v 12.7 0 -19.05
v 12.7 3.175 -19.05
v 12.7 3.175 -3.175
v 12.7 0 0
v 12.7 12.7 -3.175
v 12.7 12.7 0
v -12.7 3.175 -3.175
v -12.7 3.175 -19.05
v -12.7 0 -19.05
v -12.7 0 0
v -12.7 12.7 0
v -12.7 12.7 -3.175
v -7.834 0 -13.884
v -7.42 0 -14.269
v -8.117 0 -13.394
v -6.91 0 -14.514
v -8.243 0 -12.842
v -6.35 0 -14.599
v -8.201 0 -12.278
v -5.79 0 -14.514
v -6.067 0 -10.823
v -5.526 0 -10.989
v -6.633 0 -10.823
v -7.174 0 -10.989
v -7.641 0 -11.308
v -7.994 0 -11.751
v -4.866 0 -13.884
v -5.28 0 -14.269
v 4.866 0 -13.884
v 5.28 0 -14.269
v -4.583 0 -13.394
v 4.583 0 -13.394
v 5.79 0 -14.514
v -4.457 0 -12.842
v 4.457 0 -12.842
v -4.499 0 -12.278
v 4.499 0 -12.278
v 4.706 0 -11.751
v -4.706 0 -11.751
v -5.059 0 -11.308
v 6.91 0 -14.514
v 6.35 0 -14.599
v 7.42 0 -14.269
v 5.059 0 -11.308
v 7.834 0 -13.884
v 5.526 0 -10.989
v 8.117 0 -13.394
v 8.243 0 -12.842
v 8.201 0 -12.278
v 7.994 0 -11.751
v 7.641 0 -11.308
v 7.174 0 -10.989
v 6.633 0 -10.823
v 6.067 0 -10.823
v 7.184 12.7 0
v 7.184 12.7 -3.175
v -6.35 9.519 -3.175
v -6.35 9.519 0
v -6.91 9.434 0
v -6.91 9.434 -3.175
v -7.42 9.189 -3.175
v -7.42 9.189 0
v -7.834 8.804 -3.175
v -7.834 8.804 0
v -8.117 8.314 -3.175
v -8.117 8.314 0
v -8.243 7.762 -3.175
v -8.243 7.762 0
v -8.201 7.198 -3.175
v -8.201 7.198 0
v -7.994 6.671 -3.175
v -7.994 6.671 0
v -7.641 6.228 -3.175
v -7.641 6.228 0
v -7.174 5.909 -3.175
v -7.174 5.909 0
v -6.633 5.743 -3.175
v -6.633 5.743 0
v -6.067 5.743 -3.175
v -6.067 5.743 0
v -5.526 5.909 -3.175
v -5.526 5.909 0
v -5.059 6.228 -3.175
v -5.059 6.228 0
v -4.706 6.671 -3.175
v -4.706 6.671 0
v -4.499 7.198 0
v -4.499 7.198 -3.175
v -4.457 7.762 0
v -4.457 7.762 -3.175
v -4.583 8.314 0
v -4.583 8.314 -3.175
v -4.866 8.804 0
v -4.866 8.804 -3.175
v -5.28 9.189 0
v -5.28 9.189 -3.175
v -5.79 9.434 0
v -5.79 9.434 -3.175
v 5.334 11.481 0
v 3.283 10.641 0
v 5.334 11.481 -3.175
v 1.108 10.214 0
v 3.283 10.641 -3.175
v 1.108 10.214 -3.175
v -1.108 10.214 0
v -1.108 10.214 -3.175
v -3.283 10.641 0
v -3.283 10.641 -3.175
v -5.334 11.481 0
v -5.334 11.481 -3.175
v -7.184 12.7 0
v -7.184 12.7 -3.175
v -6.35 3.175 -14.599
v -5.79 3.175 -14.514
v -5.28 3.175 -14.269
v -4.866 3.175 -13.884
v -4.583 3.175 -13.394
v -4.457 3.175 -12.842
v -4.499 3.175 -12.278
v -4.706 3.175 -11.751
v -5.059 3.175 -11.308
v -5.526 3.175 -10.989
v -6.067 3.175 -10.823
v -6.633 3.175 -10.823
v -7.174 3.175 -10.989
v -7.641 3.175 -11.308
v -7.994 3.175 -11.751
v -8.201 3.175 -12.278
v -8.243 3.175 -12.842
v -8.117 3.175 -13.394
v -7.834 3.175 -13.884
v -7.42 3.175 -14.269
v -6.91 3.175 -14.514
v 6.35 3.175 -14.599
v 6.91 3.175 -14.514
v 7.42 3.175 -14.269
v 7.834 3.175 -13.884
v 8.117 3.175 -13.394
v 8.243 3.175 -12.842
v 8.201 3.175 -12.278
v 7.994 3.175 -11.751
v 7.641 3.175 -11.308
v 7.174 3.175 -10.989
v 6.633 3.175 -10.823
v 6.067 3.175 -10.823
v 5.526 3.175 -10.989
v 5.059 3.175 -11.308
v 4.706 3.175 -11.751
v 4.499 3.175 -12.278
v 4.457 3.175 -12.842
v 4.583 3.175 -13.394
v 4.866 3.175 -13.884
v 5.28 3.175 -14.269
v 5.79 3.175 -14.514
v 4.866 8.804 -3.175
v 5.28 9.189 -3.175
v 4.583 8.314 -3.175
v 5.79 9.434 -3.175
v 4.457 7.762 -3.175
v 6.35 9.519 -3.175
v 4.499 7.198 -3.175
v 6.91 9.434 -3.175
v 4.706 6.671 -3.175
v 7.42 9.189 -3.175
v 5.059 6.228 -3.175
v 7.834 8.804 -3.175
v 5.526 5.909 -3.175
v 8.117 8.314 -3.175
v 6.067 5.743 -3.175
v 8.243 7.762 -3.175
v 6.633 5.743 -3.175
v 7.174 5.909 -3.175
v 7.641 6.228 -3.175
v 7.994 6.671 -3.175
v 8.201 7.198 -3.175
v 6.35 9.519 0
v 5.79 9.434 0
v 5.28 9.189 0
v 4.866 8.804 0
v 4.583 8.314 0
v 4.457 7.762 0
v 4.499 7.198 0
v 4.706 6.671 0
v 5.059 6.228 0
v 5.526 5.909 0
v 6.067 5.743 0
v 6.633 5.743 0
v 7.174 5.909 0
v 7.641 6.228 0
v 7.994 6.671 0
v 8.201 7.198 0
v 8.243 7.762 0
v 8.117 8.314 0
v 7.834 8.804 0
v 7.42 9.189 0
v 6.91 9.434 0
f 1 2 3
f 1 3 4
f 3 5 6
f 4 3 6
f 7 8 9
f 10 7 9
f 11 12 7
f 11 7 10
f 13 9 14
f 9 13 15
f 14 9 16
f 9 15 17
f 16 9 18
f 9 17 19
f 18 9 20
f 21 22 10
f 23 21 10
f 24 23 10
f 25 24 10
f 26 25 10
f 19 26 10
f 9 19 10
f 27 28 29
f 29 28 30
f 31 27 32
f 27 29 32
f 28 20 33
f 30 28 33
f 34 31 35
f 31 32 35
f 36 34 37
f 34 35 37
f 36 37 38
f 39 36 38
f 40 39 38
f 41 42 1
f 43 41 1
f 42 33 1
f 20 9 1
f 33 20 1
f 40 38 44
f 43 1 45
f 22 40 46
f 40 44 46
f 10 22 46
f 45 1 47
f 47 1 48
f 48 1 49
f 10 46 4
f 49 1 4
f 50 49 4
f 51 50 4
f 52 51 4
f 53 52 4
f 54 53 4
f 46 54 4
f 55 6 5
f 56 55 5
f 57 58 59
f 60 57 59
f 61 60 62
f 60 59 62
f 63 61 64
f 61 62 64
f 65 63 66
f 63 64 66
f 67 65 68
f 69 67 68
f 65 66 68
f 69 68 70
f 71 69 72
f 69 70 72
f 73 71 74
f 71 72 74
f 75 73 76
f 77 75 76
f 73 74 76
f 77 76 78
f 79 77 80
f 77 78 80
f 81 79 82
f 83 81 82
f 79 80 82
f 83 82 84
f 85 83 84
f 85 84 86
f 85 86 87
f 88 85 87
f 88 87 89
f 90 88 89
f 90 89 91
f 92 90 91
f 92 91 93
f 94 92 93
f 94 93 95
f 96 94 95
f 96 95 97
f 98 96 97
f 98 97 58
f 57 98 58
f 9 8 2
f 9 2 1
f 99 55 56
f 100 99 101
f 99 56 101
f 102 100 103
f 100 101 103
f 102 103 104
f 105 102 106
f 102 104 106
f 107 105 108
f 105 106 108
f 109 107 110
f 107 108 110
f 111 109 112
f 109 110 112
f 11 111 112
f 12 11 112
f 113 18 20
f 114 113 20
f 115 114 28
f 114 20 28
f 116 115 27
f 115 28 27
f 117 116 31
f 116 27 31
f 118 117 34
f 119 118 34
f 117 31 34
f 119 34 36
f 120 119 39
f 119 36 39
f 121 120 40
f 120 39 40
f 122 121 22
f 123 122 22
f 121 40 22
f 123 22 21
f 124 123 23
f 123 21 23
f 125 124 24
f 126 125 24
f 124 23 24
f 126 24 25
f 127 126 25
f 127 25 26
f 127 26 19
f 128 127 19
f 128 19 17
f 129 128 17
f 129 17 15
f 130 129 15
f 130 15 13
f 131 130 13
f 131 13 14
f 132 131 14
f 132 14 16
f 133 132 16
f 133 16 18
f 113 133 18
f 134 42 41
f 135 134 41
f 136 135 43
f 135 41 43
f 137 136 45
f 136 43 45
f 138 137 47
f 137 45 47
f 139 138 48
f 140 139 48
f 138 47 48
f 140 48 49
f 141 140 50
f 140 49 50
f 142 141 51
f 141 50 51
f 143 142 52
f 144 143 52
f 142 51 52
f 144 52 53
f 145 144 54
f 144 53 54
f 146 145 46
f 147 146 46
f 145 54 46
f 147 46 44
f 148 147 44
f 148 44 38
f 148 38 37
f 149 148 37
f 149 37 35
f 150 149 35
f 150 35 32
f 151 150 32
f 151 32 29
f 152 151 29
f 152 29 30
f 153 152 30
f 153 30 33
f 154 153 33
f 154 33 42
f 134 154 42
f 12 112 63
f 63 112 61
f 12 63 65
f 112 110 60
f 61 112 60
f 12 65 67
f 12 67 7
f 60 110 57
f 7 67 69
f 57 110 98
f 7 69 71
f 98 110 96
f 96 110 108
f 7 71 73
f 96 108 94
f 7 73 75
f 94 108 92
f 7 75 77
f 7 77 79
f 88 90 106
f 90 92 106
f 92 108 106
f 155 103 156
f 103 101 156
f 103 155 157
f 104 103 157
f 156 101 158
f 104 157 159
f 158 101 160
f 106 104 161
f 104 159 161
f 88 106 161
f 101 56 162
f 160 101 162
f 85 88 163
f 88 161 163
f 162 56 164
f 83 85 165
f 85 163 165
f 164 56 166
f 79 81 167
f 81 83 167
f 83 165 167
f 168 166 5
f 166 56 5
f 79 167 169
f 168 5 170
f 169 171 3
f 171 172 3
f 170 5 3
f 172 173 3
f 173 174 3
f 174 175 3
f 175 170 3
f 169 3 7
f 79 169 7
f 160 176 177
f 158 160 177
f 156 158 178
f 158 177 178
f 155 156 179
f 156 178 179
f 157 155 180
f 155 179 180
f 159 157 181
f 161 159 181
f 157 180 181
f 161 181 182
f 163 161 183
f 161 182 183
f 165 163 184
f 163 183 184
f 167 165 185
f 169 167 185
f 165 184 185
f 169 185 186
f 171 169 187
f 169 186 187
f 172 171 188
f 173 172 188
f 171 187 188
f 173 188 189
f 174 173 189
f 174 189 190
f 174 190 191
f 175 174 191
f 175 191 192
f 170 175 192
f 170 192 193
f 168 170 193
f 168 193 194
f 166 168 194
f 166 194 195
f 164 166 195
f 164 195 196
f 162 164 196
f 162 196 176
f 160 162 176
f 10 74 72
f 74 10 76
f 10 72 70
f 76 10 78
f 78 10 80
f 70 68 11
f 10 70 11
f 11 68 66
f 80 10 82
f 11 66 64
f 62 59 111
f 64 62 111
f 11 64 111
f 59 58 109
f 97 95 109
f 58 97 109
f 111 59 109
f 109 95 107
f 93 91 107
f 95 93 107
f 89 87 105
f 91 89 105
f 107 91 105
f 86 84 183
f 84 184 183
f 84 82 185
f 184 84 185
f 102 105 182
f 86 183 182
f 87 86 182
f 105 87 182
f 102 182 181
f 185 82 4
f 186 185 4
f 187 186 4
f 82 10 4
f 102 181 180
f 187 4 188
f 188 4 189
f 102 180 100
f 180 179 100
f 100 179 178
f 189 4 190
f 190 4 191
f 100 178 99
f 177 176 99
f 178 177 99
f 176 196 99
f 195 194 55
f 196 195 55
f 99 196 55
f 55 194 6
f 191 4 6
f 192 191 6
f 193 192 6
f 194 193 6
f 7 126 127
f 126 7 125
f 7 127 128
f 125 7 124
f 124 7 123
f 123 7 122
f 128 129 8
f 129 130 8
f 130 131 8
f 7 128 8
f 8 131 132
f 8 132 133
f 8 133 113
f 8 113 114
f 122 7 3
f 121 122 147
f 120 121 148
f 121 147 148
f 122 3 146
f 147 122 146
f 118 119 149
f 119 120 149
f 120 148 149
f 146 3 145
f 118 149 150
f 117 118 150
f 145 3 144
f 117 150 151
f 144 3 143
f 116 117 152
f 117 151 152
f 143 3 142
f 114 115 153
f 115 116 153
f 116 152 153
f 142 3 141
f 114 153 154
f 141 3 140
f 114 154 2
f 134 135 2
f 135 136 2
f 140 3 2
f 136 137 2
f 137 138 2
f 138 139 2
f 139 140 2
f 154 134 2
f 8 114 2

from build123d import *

# Parameters (mm, degrees)
EXTRUDE1_DEPTH                      = 12.7
EXTRUDE1_DEPTH_BACK                 = 12.7
F_6_CLEARANCE_HOLE1_D               = 3.7973
F_6_CLEARANCE_HOLE1_DEPTH           = 12.7
F_6_CLEARANCE_HOLE1_TIP             = 1.140824014
F_6_CLEARANCE_HOLE1_ON_FACE_2_D     = 3.7973
F_6_CLEARANCE_HOLE1_ON_FACE_2_DEPTH = 12.7
F_6_CLEARANCE_HOLE1_ON_FACE_2_TIP   = 1.140824014
SKETCH4_R                           = 11.43
CUT_EXTRUDE1_DEPTH                  = 24.970724332


with BuildPart() as part:
    # Sketch2 → Extrude1 (new, two sides: drawn at the far end of the back side and taken through both)
    with BuildSketch(Plane(origin=(0, 0, 0), x_dir=(0, 0, -1), z_dir=(1, 0, 0)).offset(-EXTRUDE1_DEPTH_BACK)):
        Polygon((0, 0), (0, 12.7), (3.175, 12.7), (3.175, 3.175), (19.05, 3.175), (19.05, 0), align=None)
    extrude(amount=EXTRUDE1_DEPTH + EXTRUDE1_DEPTH_BACK)

    # #6 Clearance Hole1
    with Locations(Plane(origin=(6.35, 7.62, -3.175), x_dir=(0, -1, 0), z_dir=(0, 0, -1))):
        with Locations((0, 0), (0, 12.7)):
            Hole(F_6_CLEARANCE_HOLE1_D / 2, depth=F_6_CLEARANCE_HOLE1_DEPTH)
            with Locations((0, 0, -(F_6_CLEARANCE_HOLE1_DEPTH + F_6_CLEARANCE_HOLE1_TIP / 2))):  # 118° drill point
                Cone(0, F_6_CLEARANCE_HOLE1_D / 2, F_6_CLEARANCE_HOLE1_TIP, mode=Mode.SUBTRACT)

    # #6 Clearance Hole1 on face 2
    with Locations(Plane(origin=(6.35, 3.175, -12.7), x_dir=(0, 0, 1), z_dir=(0, 1, 0))):
        with Locations((0, 0), (0, -12.7)):
            Hole(F_6_CLEARANCE_HOLE1_ON_FACE_2_D / 2, depth=F_6_CLEARANCE_HOLE1_ON_FACE_2_DEPTH)
            with Locations((0, 0, -(F_6_CLEARANCE_HOLE1_ON_FACE_2_DEPTH + F_6_CLEARANCE_HOLE1_ON_FACE_2_TIP / 2))):  # 118° drill point
                Cone(0, F_6_CLEARANCE_HOLE1_ON_FACE_2_D / 2, F_6_CLEARANCE_HOLE1_ON_FACE_2_TIP, mode=Mode.SUBTRACT)

    # Sketch4 → Cut-Extrude1 (cut, through all)
    with BuildSketch(Plane(origin=(0, 0, -3.175), x_dir=(-1, 0, 0), z_dir=(0, 0, -1))):
        with Locations((0, 21.59)):
            Circle(SKETCH4_R)
    extrude(amount=-CUT_EXTRUDE1_DEPTH, mode=Mode.SUBTRACT)


solid = part.part
